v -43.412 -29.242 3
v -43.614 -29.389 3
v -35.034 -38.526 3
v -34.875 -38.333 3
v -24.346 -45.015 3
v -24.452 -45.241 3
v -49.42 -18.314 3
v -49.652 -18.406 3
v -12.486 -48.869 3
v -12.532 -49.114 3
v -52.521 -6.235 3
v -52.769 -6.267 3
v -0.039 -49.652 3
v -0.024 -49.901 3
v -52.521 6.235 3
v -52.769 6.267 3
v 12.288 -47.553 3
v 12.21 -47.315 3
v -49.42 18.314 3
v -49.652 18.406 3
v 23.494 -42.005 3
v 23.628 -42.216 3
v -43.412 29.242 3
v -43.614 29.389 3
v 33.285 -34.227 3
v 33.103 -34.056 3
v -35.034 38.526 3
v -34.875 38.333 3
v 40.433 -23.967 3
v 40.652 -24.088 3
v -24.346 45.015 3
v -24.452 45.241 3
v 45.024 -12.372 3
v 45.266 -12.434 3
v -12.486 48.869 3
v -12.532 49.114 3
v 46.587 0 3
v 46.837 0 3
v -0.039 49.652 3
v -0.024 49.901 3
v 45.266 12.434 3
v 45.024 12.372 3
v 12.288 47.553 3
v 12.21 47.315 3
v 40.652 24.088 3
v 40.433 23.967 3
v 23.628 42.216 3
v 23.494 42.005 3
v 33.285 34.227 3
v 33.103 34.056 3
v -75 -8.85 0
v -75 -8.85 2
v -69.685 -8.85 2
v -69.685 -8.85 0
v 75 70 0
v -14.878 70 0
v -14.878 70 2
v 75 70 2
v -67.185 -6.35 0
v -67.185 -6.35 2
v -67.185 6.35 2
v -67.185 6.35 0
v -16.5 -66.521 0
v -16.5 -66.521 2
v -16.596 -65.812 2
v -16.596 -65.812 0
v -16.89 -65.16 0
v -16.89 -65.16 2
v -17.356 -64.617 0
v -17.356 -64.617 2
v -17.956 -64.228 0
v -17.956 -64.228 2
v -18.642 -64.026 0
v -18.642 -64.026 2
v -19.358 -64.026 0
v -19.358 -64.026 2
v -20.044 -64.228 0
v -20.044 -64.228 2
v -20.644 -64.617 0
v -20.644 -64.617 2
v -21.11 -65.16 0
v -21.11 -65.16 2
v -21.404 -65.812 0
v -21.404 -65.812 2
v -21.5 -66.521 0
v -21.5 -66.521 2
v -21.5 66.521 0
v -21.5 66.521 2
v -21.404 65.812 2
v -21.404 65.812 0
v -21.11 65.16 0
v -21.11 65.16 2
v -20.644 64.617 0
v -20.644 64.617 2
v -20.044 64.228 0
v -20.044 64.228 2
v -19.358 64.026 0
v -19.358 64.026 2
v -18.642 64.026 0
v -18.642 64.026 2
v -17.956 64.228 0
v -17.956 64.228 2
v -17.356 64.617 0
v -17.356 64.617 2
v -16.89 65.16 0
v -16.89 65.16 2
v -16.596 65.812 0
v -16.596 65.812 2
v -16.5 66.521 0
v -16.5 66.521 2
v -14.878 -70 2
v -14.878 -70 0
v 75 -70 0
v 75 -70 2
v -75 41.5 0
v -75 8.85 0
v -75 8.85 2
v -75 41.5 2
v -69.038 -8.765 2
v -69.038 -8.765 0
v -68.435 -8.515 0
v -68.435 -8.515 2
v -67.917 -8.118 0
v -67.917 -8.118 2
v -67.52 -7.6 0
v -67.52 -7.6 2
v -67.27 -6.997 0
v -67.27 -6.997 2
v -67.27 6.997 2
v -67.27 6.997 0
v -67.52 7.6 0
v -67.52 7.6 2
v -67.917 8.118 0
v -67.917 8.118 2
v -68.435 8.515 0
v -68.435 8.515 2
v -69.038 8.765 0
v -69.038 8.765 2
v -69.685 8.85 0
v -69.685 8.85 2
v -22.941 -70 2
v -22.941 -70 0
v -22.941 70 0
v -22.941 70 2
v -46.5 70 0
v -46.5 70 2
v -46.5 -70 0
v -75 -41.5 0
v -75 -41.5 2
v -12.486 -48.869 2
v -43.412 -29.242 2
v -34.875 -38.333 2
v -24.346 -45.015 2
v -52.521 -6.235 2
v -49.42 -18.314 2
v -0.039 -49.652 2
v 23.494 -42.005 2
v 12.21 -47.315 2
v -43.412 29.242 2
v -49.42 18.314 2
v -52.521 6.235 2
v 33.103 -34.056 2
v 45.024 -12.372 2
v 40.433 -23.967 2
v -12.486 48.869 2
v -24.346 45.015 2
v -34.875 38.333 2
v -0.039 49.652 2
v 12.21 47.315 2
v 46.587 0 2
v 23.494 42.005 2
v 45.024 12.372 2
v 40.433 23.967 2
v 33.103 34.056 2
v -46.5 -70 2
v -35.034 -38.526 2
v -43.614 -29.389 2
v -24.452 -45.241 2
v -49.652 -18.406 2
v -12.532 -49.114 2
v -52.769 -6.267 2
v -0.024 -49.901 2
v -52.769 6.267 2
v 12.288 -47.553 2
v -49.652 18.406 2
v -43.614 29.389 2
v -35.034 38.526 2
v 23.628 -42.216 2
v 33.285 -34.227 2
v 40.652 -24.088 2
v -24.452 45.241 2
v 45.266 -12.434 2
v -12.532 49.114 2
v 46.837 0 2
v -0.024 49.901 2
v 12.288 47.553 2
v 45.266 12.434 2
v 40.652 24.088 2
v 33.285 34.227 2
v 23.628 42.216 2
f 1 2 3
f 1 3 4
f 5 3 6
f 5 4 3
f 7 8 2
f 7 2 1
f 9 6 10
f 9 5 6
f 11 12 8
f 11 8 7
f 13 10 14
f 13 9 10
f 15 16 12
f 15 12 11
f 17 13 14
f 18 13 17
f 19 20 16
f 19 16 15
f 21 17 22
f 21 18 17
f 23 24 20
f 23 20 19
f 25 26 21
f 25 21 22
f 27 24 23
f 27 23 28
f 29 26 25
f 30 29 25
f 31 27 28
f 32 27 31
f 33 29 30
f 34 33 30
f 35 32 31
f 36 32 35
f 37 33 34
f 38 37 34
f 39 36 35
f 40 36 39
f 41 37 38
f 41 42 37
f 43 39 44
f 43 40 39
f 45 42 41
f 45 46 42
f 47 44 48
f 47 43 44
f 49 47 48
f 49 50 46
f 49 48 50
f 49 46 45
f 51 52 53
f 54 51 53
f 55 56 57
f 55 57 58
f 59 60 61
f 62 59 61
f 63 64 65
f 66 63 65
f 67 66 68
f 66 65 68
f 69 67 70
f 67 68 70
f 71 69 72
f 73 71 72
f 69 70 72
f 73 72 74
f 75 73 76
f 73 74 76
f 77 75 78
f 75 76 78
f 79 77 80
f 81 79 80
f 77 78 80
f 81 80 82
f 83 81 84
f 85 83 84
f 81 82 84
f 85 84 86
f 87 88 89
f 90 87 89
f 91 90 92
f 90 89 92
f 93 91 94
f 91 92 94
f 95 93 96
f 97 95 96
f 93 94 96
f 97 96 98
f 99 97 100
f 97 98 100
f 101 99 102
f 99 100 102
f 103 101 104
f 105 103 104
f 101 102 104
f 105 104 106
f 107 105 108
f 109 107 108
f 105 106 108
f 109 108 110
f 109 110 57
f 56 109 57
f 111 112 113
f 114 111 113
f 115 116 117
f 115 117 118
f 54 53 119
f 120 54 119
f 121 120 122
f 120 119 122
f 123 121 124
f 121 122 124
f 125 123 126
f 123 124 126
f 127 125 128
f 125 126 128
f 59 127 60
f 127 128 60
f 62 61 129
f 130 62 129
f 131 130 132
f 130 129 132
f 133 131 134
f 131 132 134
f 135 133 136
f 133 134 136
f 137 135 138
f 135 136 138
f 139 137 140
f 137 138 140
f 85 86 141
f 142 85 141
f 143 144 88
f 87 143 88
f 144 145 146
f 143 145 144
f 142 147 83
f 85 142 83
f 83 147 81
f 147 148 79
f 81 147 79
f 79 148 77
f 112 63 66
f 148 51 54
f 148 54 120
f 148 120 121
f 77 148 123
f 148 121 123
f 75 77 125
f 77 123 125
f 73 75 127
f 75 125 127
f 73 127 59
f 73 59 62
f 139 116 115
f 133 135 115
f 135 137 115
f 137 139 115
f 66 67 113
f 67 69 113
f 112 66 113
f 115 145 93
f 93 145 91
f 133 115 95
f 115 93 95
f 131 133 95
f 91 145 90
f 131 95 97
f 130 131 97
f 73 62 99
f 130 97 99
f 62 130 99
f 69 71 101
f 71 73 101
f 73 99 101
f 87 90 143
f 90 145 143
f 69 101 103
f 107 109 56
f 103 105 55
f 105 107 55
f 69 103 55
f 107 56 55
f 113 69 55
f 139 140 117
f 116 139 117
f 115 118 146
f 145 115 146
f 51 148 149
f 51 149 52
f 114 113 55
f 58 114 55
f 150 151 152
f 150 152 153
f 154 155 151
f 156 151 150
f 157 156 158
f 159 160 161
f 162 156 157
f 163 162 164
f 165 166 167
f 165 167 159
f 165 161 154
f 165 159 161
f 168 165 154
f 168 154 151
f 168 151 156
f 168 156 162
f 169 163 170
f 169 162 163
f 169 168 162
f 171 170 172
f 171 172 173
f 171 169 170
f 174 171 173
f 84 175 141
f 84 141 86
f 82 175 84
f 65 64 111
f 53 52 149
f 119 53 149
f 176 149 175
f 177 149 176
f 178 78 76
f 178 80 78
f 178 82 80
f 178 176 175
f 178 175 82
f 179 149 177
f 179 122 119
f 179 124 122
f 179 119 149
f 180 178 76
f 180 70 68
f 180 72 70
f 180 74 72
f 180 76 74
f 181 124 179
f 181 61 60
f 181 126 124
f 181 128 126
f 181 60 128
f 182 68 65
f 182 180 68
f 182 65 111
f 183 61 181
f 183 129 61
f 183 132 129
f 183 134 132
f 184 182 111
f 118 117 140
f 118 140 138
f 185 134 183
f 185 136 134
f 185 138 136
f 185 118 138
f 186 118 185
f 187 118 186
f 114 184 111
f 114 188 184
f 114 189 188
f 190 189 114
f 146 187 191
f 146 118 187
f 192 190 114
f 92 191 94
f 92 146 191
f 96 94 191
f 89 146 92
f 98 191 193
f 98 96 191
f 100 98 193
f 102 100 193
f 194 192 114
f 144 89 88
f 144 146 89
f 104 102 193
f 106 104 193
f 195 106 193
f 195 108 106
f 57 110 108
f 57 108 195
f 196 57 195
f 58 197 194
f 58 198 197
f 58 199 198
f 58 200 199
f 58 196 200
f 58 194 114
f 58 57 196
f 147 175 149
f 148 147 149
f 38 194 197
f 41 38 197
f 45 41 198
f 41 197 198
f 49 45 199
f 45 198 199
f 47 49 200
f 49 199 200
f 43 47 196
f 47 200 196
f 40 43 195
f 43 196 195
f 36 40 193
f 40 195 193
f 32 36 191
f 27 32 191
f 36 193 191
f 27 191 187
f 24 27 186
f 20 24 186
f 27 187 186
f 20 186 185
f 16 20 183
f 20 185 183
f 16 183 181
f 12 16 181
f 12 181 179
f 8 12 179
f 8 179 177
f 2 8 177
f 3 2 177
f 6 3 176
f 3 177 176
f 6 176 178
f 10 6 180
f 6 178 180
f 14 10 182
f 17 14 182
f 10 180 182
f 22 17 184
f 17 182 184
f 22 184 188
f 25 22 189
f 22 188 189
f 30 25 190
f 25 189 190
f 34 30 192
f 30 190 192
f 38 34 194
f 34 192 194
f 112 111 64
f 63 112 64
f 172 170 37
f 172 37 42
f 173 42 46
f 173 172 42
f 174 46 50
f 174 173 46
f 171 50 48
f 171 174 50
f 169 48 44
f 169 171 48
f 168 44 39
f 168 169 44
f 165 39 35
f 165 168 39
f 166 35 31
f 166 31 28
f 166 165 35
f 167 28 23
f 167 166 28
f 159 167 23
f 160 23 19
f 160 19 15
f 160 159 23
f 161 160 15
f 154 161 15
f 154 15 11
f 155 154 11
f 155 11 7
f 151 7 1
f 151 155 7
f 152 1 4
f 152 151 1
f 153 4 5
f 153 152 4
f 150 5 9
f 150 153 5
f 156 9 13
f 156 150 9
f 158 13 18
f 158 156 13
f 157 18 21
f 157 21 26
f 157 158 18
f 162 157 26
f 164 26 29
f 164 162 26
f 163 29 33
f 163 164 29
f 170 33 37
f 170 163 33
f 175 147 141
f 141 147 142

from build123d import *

# Parameters (mm, degrees)
F0_W     = 150
F0_H     = 140
F1_DEPTH = 2
F2_R     = 2.5
F3_DEPTH = 5
F4_R     = 50
F4_R_2   = 49.75
F5_DEPTH = 1


with BuildPart() as f1:
    # F0 (on Top) → F1 (new body)
    with BuildSketch(Plane.XY):
        Rectangle(F0_W, F0_H)
    extrude(amount=F1_DEPTH)

    # F2 (on face) → F3 (cut)
    with BuildSketch(Plane.XY.offset(2)):
        Polygon((-75, 70), (-75, 41.5), (-46.5, 70), align=None)
        with Locations((-64, 57.6)):
            Circle(F2_R, mode=Mode.SUBTRACT)
        Polygon((-46.5, -70), (-75, -41.5), (-75, -70), align=None)
        with Locations((-64, -57.6)):
            Circle(F2_R, mode=Mode.SUBTRACT)
        with BuildLine():
            Line((-67.1845650673, -6.35), (-67.1845650673, 6.35))
            ThreePointArc((-67.1845650673, 6.35), (-67.9167981143, 8.117766953), (-69.6845650673, 8.85))
            Line((-69.6845650673, 8.85), (-75, 8.85))
            Line((-75, 8.85), (-75, -8.85))
            Line((-75, -8.85), (-69.6845650673, -8.85))
            ThreePointArc((-69.6845650673, -8.85), (-67.9167981143, -8.117766953), (-67.1845650673, -6.35))
        make_face()
        with BuildLine():
            Line((-21.499911428, -66.5210440509), (-22.940942165, -70))
            Line((-22.940942165, -70), (-14.8778247705, -70))
            Line((-14.8778247705, -70), (-16.500088572, -66.5210440509))
            ThreePointArc((-16.500088572, -66.5210440509), (-19, -64), (-21.499911428, -66.5210440509))
        make_face()
        with BuildLine():
            Line((-14.8778247705, 70), (-22.940942165, 70))
            Line((-22.940942165, 70), (-21.499911428, 66.5210440509))
            ThreePointArc((-21.499911428, 66.5210440509), (-19, 64), (-16.500088572, 66.5210440509))
            Line((-16.500088572, 66.5210440509), (-14.8778247705, 70))
        make_face()
        with Locations((-64, 57.6)):
            Circle(F2_R)
        with Locations((-64, -57.6)):
            Circle(F2_R)
    extrude(amount=-F3_DEPTH, mode=Mode.SUBTRACT)

    # F4 (on face) → F5 (join)
    with BuildSketch(Plane.XY.offset(2)):
        with Locations((-3.16328, 0)):
            Circle(F4_R)
        with Locations((-3.16328, 0)):
            Circle(F4_R_2, mode=Mode.SUBTRACT)
    extrude(amount=F5_DEPTH)


solid = f1.part
